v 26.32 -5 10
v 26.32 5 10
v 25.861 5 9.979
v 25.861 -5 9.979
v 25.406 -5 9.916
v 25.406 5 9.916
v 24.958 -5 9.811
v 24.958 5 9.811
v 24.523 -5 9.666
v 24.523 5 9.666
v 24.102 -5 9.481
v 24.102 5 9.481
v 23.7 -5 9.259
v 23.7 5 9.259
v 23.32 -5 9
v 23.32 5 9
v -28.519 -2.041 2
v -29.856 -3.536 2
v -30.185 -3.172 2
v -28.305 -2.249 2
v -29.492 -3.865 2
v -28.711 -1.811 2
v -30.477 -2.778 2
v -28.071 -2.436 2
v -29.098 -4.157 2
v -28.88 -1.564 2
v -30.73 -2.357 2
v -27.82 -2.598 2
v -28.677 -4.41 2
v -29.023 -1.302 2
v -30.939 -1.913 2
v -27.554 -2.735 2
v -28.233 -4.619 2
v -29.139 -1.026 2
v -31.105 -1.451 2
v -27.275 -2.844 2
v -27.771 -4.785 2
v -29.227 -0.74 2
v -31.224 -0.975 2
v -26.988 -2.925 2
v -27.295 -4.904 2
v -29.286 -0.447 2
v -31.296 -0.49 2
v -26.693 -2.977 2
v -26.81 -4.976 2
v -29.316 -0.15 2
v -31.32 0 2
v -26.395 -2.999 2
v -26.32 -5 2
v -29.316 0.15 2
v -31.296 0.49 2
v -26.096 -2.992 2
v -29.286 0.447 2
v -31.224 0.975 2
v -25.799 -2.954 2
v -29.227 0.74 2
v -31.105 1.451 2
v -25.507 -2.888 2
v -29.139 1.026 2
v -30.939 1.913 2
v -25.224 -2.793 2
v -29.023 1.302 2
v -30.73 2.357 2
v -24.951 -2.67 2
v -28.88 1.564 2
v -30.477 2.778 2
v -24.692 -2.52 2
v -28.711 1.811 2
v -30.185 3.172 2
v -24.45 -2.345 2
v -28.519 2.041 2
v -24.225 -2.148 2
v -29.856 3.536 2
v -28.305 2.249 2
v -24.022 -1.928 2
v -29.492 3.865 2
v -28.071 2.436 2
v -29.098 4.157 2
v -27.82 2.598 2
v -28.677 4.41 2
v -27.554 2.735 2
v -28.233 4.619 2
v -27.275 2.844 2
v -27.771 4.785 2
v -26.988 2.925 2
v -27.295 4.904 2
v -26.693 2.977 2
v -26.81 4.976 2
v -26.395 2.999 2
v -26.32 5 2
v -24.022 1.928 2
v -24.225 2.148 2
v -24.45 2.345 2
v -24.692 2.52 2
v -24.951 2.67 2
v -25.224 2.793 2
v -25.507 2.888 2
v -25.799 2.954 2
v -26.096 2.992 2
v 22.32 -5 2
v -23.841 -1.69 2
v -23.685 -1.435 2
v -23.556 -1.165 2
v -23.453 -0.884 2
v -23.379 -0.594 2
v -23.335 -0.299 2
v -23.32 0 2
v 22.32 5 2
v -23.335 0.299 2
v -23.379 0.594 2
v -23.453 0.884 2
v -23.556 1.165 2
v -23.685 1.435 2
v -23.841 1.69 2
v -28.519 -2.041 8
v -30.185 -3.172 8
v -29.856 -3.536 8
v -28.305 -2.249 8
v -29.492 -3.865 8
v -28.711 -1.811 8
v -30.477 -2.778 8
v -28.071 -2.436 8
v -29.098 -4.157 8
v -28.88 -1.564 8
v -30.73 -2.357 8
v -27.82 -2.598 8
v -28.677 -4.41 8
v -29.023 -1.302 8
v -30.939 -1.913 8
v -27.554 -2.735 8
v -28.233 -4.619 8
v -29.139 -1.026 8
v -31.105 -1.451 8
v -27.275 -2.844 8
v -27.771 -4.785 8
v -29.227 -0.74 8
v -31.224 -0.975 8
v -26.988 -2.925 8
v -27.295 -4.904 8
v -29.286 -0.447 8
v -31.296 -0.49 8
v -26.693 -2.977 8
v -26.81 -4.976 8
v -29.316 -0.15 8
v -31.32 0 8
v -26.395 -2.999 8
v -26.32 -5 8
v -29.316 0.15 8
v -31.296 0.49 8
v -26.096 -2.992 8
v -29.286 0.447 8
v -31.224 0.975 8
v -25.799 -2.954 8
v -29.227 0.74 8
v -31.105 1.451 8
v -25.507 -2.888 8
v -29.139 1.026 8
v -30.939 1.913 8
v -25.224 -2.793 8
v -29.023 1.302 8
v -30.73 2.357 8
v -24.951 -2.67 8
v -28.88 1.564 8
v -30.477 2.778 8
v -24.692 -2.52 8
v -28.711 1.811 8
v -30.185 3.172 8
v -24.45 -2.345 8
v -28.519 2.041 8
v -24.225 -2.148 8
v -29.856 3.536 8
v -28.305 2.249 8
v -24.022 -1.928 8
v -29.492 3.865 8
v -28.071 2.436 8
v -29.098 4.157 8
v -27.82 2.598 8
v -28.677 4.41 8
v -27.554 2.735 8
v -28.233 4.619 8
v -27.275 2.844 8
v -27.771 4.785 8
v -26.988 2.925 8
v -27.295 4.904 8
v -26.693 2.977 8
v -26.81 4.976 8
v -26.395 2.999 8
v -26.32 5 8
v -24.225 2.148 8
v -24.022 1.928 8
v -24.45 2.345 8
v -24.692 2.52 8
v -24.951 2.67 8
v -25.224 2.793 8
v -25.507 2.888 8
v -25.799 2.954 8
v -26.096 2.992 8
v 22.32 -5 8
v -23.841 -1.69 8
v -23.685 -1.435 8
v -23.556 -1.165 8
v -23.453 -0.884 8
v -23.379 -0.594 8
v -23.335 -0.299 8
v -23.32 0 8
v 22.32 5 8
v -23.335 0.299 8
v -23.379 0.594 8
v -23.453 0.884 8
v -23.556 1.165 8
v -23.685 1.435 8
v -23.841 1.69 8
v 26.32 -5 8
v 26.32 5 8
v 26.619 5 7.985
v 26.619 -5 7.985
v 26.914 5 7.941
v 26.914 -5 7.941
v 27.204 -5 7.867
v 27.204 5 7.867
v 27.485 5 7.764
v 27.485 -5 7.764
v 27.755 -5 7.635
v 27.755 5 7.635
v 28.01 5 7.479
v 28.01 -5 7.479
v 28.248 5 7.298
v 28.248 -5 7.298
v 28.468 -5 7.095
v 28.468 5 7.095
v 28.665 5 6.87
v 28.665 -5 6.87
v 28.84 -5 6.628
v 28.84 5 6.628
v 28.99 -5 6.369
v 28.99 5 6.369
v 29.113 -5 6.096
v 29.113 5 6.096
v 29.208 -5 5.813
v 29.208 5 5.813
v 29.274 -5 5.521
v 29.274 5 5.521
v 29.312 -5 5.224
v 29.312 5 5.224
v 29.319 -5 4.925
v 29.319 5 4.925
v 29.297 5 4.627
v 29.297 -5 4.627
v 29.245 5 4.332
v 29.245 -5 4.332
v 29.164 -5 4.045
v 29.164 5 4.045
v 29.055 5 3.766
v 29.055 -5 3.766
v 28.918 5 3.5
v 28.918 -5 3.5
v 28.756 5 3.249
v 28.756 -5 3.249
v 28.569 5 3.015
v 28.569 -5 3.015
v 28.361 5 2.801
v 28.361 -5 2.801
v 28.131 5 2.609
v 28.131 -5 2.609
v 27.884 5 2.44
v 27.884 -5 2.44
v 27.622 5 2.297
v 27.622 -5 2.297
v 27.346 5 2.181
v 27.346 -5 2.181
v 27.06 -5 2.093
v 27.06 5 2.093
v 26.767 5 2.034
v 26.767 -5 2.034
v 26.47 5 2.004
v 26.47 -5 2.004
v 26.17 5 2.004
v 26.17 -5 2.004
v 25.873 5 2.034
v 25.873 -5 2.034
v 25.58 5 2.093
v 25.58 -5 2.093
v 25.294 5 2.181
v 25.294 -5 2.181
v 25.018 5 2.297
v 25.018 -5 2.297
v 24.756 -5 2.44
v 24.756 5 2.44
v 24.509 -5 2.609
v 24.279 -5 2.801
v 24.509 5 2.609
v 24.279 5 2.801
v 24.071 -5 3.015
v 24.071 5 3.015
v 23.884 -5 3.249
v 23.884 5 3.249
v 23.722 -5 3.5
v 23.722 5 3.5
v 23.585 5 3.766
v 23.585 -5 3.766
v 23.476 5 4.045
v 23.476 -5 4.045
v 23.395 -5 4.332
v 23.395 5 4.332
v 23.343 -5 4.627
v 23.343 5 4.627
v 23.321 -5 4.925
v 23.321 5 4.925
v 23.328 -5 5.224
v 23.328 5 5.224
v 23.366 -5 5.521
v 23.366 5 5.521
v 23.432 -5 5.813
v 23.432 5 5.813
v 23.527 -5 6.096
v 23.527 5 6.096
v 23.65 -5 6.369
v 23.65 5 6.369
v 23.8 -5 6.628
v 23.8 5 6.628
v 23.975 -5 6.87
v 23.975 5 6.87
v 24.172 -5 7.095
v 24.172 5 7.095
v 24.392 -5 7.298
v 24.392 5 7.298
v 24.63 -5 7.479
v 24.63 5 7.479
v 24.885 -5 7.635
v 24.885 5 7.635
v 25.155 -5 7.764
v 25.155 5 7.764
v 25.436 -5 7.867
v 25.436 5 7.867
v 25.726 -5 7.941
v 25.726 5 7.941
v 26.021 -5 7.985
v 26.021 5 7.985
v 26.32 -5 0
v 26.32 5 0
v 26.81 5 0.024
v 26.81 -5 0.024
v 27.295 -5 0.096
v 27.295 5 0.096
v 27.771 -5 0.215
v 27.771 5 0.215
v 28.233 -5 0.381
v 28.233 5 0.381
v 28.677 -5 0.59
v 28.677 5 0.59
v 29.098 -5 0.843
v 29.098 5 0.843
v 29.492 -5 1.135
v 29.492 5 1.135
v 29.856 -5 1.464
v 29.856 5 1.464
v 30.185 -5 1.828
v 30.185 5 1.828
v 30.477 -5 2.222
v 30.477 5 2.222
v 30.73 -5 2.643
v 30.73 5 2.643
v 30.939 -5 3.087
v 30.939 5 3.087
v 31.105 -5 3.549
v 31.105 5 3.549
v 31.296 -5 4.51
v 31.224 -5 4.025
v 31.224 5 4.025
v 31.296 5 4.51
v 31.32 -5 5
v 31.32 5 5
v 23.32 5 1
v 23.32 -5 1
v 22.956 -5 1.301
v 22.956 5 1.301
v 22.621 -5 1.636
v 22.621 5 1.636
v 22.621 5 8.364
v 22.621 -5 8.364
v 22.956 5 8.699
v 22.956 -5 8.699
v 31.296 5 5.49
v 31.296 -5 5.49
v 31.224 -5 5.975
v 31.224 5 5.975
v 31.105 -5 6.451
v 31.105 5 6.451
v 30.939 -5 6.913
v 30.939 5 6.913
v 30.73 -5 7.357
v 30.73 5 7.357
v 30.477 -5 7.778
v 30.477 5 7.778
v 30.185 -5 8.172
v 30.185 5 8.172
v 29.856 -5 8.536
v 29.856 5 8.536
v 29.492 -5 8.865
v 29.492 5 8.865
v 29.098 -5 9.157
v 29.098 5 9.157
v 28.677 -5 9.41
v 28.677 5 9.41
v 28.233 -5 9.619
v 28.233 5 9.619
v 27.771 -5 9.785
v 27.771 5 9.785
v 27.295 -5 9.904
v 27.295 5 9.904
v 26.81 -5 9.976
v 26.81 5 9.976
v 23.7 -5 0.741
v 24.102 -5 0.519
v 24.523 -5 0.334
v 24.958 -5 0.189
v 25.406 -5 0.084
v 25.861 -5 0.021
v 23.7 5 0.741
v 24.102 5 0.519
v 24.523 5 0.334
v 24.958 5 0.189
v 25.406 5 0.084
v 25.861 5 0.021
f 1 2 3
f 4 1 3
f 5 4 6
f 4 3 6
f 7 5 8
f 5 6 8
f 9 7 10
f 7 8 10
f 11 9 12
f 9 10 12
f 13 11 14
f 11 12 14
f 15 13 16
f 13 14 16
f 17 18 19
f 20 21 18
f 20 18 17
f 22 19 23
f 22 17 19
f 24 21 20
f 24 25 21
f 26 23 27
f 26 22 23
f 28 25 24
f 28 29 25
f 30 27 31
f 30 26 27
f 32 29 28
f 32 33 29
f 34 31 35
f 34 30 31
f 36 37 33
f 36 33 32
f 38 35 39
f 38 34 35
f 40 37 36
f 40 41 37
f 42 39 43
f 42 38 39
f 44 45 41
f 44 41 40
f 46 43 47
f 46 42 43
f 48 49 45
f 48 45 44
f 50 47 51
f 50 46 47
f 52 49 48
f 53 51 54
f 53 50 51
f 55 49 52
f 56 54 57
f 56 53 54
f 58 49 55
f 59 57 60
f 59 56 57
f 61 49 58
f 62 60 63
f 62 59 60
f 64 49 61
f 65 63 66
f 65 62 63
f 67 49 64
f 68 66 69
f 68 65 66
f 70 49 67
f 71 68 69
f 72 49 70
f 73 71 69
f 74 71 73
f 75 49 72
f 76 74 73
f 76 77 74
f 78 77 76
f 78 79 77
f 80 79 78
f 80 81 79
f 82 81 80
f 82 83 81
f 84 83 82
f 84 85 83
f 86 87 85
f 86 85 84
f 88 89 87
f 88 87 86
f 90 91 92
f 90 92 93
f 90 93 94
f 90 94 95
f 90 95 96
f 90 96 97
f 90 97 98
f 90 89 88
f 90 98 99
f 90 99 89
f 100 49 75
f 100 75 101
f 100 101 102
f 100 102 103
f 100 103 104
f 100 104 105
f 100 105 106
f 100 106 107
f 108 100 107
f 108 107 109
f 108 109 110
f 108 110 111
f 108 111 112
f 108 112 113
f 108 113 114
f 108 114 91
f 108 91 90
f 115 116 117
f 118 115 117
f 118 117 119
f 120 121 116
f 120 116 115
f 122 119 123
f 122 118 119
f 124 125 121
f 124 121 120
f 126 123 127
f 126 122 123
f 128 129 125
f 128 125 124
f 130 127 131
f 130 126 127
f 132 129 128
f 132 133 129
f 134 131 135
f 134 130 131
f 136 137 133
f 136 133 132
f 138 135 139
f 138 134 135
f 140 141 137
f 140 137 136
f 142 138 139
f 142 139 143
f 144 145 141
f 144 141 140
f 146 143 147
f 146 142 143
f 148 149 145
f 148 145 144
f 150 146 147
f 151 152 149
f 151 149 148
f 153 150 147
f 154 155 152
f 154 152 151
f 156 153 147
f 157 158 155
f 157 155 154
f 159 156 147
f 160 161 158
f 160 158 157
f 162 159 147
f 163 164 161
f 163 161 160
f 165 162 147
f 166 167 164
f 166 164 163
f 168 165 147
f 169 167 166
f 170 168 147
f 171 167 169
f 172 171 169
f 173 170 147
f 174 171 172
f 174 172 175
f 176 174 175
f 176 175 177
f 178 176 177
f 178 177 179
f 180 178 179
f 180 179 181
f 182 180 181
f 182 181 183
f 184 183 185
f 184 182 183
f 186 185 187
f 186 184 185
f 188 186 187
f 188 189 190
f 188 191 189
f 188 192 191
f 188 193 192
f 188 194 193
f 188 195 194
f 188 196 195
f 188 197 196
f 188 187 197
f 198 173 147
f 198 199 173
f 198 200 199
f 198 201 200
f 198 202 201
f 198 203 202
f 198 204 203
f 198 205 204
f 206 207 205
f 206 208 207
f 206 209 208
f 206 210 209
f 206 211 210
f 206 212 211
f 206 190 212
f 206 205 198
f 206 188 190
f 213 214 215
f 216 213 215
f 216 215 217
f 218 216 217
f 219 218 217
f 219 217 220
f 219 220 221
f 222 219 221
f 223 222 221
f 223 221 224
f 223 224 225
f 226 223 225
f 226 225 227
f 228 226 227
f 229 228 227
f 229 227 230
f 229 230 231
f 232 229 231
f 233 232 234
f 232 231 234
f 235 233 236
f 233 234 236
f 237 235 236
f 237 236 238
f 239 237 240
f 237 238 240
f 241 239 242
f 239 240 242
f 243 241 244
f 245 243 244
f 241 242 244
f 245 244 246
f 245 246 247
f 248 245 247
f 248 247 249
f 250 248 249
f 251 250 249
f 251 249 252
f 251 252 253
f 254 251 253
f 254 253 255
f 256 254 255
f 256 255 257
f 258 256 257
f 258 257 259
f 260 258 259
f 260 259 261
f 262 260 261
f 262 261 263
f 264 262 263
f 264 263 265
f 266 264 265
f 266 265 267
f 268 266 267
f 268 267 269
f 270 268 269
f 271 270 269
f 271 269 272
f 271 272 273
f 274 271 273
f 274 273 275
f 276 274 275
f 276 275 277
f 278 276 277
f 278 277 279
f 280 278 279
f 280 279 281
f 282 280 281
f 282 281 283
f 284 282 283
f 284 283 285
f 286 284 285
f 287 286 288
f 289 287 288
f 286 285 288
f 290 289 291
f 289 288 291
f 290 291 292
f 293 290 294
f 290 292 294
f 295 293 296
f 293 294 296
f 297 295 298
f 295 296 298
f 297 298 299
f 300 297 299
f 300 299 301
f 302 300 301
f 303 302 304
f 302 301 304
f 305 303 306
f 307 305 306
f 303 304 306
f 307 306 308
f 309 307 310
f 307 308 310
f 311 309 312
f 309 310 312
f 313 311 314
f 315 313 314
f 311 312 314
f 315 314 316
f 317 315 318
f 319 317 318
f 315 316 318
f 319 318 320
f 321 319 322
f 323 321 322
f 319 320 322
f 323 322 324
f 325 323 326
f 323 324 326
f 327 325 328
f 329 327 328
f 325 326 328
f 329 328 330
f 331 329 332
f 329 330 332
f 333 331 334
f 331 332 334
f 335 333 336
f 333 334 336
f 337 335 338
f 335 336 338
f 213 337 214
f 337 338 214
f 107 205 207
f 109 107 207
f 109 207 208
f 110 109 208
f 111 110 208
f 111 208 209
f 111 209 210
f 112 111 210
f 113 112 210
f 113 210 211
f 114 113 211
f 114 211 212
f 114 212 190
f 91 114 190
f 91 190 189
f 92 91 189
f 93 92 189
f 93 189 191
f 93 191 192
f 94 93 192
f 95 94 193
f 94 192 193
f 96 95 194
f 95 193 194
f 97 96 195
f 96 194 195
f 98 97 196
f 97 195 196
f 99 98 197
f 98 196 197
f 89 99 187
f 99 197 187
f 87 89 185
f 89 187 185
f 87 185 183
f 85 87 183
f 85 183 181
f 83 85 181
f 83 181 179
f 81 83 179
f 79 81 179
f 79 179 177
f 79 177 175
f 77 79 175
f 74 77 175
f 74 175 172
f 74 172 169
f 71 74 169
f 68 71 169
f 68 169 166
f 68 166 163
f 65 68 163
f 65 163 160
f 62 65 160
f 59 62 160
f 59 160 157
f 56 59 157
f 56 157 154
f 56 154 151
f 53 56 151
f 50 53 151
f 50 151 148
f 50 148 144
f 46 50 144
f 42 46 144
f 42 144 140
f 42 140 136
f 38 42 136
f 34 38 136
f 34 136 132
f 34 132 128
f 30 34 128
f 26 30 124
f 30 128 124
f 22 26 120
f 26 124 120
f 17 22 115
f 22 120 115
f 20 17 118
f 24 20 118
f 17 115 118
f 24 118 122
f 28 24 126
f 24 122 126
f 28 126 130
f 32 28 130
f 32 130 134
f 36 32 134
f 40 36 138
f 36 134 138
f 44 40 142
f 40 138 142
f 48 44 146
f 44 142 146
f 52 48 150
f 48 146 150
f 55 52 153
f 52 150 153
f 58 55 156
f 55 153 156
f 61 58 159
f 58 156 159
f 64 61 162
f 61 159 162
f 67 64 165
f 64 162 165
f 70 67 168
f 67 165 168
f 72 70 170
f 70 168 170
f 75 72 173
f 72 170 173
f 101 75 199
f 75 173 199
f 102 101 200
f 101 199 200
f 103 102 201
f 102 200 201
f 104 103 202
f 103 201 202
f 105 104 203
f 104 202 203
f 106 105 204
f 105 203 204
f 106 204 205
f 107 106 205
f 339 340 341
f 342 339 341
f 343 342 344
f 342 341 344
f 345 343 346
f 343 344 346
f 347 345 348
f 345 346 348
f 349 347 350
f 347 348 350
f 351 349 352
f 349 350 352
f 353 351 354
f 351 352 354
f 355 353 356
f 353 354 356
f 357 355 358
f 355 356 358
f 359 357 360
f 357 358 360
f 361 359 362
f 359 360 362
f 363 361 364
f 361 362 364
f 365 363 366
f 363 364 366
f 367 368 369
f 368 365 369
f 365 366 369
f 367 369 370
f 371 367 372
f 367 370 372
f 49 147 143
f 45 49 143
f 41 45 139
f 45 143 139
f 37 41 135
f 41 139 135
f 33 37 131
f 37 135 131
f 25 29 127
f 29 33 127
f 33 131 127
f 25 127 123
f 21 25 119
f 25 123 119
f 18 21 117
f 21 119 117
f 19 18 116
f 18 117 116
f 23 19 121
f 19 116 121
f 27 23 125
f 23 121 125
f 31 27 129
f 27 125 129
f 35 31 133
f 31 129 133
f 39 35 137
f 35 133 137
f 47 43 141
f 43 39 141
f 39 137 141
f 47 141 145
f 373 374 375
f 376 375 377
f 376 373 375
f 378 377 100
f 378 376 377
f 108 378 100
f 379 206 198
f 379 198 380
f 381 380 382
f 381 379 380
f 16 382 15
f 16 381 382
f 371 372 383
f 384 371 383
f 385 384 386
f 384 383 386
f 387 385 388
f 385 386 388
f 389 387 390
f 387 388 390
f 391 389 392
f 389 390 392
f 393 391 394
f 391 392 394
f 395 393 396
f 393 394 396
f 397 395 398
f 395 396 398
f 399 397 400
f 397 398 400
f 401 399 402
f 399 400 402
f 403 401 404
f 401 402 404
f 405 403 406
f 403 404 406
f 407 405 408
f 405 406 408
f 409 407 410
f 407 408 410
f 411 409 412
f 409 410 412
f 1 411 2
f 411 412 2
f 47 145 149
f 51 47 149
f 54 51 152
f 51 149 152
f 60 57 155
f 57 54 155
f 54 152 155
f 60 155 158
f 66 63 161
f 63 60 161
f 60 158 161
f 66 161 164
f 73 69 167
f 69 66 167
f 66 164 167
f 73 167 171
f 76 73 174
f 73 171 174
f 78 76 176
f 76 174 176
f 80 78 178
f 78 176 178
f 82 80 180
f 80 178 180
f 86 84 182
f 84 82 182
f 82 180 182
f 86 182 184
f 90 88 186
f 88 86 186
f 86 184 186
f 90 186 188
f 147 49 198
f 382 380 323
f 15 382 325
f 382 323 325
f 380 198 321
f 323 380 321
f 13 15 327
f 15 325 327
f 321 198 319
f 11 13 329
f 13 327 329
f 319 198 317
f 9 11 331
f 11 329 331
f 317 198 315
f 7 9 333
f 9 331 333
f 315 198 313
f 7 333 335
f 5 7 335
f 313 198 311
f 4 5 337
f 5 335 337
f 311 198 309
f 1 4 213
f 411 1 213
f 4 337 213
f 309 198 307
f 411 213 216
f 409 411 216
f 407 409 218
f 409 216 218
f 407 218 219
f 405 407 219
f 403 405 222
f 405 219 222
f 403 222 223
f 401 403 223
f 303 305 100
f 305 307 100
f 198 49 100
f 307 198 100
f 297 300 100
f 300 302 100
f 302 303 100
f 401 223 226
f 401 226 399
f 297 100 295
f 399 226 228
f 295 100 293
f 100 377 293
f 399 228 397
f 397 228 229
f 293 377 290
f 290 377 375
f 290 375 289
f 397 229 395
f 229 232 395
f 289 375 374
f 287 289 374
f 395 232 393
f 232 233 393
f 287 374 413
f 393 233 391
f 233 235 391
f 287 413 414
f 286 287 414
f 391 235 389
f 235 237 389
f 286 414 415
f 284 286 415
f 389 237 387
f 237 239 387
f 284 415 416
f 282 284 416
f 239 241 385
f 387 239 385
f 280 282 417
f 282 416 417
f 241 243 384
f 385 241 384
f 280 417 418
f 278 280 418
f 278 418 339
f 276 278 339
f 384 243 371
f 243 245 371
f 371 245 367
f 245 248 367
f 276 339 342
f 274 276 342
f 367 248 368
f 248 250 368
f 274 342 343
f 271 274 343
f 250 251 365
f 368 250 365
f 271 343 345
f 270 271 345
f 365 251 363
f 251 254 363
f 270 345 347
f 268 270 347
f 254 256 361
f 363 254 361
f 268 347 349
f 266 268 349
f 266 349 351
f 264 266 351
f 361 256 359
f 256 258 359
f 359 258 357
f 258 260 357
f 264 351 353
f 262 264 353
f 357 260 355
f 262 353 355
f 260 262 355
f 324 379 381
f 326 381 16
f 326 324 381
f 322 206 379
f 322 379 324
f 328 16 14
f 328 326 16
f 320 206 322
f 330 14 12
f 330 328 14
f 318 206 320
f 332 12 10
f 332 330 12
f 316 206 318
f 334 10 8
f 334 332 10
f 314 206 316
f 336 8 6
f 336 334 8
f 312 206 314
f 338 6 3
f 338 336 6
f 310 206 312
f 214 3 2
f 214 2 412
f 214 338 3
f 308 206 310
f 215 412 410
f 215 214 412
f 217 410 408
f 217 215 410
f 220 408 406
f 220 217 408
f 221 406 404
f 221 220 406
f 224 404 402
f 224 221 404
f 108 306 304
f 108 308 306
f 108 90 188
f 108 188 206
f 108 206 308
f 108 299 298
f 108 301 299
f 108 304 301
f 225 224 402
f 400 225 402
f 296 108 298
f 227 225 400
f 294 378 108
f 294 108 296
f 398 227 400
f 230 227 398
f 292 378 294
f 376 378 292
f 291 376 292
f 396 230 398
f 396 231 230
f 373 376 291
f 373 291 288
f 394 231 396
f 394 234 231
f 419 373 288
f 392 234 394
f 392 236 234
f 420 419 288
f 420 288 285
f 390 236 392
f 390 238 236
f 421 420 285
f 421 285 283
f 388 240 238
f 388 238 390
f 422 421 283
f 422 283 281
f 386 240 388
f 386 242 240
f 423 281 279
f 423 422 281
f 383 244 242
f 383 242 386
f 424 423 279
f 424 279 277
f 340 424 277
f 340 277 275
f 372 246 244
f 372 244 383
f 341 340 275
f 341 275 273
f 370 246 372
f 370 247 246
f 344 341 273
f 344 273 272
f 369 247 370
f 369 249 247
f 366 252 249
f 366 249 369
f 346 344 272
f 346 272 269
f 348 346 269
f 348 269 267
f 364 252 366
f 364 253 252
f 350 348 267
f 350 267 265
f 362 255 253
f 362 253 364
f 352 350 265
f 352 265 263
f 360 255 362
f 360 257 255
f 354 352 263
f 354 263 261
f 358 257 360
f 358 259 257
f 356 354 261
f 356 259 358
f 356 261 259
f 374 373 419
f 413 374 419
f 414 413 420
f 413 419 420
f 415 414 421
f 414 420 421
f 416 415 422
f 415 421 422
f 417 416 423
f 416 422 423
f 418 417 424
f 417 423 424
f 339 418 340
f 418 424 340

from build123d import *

# Parameters (mm, degrees)
SKETCH_1_W           = 62.64
SKETCH_1_H           = 10
EXTRUDE_2_DEPTH      = 10
SKETCH_3_R           = 3
CUT_EXTRUDE_3_DEPTH  = 35.364842499
SKETCH_4_R           = 3
CUT_EXTRUDE_5_DEPTH  = 34.255712291
SKETCH_5_W           = 44.64
SKETCH_5_H           = 2
CUT_EXTRUDE_7_DEPTH  = 35.364842499
CUT_EXTRUDE_8_DEPTH  = 35.364842499
SKETCH_10_R          = 5
EXTRUDE_7_DEPTH      = 10
SKETCH_11_R          = 3
CUT_EXTRUDE_9_DEPTH  = 35.364842499
SKETCH_13_W          = 2
SKETCH_13_H          = 10
CUT_EXTRUDE_11_DEPTH = 54.814213736


with BuildPart() as part:
    # 草图1 → 凸台-拉伸2 (new body)
    with BuildSketch(Plane.XY):
        Rectangle(SKETCH_1_W, SKETCH_1_H)
    extrude(amount=EXTRUDE_2_DEPTH)

    # 草图3 → 切除-拉伸3 (cut, through all)
    with BuildSketch(Plane(origin=(0, 5, 0), x_dir=(1, 0, 0), z_dir=(0, 1, 0))):
        with BuildLine():
            ThreePointArc((31.32, -5), (29.855533906, -8.535533906), (26.32, -10))
            Line((26.32, -10), (31.32, -10))
            Line((31.32, -10), (31.32, -5))
        make_face()
        with BuildLine():
            Line((31.32, 0), (26.32, 0))
            ThreePointArc((26.32, 0), (29.855533906, -1.464466094), (31.32, -5))
            Line((31.32, -5), (31.32, 0))
        make_face()
        with Locations(Location((26.32, -5, 0), (0, 0, 270))):
            Circle(SKETCH_3_R)
    extrude(amount=-CUT_EXTRUDE_3_DEPTH, mode=Mode.SUBTRACT)

    # 草图4 → 切除-拉伸5 (cut, through all)
    with BuildSketch(Plane.XY.offset(10)):
        with BuildLine():
            ThreePointArc((-31.32, 0), (-29.855533906, 3.535533906), (-26.32, 5))
            Line((-26.32, 5), (-31.32, 5))
            Line((-31.32, 5), (-31.32, 0))
        make_face()
        with BuildLine():
            ThreePointArc((-26.32, -5), (-29.855533906, -3.535533906), (-31.32, 0))
            Line((-31.32, 0), (-31.32, -5))
            Line((-31.32, -5), (-26.32, -5))
        make_face()
        with Locations((-26.32, 0)):
            Circle(SKETCH_4_R)
    extrude(amount=-CUT_EXTRUDE_5_DEPTH, mode=Mode.SUBTRACT)

    # 草图5 → 切除-拉伸7 (cut, through all)
    with BuildSketch(Plane(origin=(0, 5, 0), x_dir=(1, 0, 0), z_dir=(0, 1, 0))):
        with Locations((1, -9)):
            Rectangle(SKETCH_5_W, SKETCH_5_H)
        with Locations((1, -1)):
            Rectangle(SKETCH_5_W, SKETCH_5_H)
    extrude(amount=-CUT_EXTRUDE_7_DEPTH, mode=Mode.SUBTRACT)

    # 草图6 → 切除-拉伸8 (cut, through all)
    with BuildSketch(Plane(origin=(0, 5, 0), x_dir=(1, 0, 0), z_dir=(0, 1, 0))):
        with BuildLine():
            Line((23.32, 0), (23.32, -1))
            ThreePointArc((23.32, -1), (24.73886117, -0.25658351), (26.32, 0))
            Line((26.32, 0), (23.32, 0))
        make_face()
        with BuildLine():
            ThreePointArc((26.32, -10), (24.73886117, -9.74341649), (23.32, -9))
            Line((23.32, -9), (23.32, -10))
            Line((23.32, -10), (26.32, -10))
        make_face()
    extrude(amount=-CUT_EXTRUDE_8_DEPTH, mode=Mode.SUBTRACT)

    # 草图10 → 凸台-拉伸7 (add)
    with BuildSketch(Plane(origin=(0, 5, 0), x_dir=(1, 0, 0), z_dir=(0, 1, 0))):
        with Locations((26.32, -5)):
            Circle(SKETCH_10_R)
    extrude(amount=-EXTRUDE_7_DEPTH)

    # 草图11 → 切除-拉伸9 (cut, through all)
    with BuildSketch(Plane(origin=(0, 5, 0), x_dir=(1, 0, 0), z_dir=(0, 1, 0))):
        with Locations(Location((26.32, -5, 0), (0, 0, 270))):
            Circle(SKETCH_11_R)
    extrude(amount=-CUT_EXTRUDE_9_DEPTH, mode=Mode.SUBTRACT)

    # 草图13 → 切除-拉伸11 (cut, through all)
    with BuildSketch(Plane(origin=(-21.32, 0, 0), x_dir=(0, 0, -1), z_dir=(1, 0, 0))):
        with Locations((-9, 0)):
            Rectangle(SKETCH_13_W, SKETCH_13_H)
        with Locations((-1, 0)):
            Rectangle(SKETCH_13_W, SKETCH_13_H)
    extrude(amount=-CUT_EXTRUDE_11_DEPTH, mode=Mode.SUBTRACT)


solid = part.part
